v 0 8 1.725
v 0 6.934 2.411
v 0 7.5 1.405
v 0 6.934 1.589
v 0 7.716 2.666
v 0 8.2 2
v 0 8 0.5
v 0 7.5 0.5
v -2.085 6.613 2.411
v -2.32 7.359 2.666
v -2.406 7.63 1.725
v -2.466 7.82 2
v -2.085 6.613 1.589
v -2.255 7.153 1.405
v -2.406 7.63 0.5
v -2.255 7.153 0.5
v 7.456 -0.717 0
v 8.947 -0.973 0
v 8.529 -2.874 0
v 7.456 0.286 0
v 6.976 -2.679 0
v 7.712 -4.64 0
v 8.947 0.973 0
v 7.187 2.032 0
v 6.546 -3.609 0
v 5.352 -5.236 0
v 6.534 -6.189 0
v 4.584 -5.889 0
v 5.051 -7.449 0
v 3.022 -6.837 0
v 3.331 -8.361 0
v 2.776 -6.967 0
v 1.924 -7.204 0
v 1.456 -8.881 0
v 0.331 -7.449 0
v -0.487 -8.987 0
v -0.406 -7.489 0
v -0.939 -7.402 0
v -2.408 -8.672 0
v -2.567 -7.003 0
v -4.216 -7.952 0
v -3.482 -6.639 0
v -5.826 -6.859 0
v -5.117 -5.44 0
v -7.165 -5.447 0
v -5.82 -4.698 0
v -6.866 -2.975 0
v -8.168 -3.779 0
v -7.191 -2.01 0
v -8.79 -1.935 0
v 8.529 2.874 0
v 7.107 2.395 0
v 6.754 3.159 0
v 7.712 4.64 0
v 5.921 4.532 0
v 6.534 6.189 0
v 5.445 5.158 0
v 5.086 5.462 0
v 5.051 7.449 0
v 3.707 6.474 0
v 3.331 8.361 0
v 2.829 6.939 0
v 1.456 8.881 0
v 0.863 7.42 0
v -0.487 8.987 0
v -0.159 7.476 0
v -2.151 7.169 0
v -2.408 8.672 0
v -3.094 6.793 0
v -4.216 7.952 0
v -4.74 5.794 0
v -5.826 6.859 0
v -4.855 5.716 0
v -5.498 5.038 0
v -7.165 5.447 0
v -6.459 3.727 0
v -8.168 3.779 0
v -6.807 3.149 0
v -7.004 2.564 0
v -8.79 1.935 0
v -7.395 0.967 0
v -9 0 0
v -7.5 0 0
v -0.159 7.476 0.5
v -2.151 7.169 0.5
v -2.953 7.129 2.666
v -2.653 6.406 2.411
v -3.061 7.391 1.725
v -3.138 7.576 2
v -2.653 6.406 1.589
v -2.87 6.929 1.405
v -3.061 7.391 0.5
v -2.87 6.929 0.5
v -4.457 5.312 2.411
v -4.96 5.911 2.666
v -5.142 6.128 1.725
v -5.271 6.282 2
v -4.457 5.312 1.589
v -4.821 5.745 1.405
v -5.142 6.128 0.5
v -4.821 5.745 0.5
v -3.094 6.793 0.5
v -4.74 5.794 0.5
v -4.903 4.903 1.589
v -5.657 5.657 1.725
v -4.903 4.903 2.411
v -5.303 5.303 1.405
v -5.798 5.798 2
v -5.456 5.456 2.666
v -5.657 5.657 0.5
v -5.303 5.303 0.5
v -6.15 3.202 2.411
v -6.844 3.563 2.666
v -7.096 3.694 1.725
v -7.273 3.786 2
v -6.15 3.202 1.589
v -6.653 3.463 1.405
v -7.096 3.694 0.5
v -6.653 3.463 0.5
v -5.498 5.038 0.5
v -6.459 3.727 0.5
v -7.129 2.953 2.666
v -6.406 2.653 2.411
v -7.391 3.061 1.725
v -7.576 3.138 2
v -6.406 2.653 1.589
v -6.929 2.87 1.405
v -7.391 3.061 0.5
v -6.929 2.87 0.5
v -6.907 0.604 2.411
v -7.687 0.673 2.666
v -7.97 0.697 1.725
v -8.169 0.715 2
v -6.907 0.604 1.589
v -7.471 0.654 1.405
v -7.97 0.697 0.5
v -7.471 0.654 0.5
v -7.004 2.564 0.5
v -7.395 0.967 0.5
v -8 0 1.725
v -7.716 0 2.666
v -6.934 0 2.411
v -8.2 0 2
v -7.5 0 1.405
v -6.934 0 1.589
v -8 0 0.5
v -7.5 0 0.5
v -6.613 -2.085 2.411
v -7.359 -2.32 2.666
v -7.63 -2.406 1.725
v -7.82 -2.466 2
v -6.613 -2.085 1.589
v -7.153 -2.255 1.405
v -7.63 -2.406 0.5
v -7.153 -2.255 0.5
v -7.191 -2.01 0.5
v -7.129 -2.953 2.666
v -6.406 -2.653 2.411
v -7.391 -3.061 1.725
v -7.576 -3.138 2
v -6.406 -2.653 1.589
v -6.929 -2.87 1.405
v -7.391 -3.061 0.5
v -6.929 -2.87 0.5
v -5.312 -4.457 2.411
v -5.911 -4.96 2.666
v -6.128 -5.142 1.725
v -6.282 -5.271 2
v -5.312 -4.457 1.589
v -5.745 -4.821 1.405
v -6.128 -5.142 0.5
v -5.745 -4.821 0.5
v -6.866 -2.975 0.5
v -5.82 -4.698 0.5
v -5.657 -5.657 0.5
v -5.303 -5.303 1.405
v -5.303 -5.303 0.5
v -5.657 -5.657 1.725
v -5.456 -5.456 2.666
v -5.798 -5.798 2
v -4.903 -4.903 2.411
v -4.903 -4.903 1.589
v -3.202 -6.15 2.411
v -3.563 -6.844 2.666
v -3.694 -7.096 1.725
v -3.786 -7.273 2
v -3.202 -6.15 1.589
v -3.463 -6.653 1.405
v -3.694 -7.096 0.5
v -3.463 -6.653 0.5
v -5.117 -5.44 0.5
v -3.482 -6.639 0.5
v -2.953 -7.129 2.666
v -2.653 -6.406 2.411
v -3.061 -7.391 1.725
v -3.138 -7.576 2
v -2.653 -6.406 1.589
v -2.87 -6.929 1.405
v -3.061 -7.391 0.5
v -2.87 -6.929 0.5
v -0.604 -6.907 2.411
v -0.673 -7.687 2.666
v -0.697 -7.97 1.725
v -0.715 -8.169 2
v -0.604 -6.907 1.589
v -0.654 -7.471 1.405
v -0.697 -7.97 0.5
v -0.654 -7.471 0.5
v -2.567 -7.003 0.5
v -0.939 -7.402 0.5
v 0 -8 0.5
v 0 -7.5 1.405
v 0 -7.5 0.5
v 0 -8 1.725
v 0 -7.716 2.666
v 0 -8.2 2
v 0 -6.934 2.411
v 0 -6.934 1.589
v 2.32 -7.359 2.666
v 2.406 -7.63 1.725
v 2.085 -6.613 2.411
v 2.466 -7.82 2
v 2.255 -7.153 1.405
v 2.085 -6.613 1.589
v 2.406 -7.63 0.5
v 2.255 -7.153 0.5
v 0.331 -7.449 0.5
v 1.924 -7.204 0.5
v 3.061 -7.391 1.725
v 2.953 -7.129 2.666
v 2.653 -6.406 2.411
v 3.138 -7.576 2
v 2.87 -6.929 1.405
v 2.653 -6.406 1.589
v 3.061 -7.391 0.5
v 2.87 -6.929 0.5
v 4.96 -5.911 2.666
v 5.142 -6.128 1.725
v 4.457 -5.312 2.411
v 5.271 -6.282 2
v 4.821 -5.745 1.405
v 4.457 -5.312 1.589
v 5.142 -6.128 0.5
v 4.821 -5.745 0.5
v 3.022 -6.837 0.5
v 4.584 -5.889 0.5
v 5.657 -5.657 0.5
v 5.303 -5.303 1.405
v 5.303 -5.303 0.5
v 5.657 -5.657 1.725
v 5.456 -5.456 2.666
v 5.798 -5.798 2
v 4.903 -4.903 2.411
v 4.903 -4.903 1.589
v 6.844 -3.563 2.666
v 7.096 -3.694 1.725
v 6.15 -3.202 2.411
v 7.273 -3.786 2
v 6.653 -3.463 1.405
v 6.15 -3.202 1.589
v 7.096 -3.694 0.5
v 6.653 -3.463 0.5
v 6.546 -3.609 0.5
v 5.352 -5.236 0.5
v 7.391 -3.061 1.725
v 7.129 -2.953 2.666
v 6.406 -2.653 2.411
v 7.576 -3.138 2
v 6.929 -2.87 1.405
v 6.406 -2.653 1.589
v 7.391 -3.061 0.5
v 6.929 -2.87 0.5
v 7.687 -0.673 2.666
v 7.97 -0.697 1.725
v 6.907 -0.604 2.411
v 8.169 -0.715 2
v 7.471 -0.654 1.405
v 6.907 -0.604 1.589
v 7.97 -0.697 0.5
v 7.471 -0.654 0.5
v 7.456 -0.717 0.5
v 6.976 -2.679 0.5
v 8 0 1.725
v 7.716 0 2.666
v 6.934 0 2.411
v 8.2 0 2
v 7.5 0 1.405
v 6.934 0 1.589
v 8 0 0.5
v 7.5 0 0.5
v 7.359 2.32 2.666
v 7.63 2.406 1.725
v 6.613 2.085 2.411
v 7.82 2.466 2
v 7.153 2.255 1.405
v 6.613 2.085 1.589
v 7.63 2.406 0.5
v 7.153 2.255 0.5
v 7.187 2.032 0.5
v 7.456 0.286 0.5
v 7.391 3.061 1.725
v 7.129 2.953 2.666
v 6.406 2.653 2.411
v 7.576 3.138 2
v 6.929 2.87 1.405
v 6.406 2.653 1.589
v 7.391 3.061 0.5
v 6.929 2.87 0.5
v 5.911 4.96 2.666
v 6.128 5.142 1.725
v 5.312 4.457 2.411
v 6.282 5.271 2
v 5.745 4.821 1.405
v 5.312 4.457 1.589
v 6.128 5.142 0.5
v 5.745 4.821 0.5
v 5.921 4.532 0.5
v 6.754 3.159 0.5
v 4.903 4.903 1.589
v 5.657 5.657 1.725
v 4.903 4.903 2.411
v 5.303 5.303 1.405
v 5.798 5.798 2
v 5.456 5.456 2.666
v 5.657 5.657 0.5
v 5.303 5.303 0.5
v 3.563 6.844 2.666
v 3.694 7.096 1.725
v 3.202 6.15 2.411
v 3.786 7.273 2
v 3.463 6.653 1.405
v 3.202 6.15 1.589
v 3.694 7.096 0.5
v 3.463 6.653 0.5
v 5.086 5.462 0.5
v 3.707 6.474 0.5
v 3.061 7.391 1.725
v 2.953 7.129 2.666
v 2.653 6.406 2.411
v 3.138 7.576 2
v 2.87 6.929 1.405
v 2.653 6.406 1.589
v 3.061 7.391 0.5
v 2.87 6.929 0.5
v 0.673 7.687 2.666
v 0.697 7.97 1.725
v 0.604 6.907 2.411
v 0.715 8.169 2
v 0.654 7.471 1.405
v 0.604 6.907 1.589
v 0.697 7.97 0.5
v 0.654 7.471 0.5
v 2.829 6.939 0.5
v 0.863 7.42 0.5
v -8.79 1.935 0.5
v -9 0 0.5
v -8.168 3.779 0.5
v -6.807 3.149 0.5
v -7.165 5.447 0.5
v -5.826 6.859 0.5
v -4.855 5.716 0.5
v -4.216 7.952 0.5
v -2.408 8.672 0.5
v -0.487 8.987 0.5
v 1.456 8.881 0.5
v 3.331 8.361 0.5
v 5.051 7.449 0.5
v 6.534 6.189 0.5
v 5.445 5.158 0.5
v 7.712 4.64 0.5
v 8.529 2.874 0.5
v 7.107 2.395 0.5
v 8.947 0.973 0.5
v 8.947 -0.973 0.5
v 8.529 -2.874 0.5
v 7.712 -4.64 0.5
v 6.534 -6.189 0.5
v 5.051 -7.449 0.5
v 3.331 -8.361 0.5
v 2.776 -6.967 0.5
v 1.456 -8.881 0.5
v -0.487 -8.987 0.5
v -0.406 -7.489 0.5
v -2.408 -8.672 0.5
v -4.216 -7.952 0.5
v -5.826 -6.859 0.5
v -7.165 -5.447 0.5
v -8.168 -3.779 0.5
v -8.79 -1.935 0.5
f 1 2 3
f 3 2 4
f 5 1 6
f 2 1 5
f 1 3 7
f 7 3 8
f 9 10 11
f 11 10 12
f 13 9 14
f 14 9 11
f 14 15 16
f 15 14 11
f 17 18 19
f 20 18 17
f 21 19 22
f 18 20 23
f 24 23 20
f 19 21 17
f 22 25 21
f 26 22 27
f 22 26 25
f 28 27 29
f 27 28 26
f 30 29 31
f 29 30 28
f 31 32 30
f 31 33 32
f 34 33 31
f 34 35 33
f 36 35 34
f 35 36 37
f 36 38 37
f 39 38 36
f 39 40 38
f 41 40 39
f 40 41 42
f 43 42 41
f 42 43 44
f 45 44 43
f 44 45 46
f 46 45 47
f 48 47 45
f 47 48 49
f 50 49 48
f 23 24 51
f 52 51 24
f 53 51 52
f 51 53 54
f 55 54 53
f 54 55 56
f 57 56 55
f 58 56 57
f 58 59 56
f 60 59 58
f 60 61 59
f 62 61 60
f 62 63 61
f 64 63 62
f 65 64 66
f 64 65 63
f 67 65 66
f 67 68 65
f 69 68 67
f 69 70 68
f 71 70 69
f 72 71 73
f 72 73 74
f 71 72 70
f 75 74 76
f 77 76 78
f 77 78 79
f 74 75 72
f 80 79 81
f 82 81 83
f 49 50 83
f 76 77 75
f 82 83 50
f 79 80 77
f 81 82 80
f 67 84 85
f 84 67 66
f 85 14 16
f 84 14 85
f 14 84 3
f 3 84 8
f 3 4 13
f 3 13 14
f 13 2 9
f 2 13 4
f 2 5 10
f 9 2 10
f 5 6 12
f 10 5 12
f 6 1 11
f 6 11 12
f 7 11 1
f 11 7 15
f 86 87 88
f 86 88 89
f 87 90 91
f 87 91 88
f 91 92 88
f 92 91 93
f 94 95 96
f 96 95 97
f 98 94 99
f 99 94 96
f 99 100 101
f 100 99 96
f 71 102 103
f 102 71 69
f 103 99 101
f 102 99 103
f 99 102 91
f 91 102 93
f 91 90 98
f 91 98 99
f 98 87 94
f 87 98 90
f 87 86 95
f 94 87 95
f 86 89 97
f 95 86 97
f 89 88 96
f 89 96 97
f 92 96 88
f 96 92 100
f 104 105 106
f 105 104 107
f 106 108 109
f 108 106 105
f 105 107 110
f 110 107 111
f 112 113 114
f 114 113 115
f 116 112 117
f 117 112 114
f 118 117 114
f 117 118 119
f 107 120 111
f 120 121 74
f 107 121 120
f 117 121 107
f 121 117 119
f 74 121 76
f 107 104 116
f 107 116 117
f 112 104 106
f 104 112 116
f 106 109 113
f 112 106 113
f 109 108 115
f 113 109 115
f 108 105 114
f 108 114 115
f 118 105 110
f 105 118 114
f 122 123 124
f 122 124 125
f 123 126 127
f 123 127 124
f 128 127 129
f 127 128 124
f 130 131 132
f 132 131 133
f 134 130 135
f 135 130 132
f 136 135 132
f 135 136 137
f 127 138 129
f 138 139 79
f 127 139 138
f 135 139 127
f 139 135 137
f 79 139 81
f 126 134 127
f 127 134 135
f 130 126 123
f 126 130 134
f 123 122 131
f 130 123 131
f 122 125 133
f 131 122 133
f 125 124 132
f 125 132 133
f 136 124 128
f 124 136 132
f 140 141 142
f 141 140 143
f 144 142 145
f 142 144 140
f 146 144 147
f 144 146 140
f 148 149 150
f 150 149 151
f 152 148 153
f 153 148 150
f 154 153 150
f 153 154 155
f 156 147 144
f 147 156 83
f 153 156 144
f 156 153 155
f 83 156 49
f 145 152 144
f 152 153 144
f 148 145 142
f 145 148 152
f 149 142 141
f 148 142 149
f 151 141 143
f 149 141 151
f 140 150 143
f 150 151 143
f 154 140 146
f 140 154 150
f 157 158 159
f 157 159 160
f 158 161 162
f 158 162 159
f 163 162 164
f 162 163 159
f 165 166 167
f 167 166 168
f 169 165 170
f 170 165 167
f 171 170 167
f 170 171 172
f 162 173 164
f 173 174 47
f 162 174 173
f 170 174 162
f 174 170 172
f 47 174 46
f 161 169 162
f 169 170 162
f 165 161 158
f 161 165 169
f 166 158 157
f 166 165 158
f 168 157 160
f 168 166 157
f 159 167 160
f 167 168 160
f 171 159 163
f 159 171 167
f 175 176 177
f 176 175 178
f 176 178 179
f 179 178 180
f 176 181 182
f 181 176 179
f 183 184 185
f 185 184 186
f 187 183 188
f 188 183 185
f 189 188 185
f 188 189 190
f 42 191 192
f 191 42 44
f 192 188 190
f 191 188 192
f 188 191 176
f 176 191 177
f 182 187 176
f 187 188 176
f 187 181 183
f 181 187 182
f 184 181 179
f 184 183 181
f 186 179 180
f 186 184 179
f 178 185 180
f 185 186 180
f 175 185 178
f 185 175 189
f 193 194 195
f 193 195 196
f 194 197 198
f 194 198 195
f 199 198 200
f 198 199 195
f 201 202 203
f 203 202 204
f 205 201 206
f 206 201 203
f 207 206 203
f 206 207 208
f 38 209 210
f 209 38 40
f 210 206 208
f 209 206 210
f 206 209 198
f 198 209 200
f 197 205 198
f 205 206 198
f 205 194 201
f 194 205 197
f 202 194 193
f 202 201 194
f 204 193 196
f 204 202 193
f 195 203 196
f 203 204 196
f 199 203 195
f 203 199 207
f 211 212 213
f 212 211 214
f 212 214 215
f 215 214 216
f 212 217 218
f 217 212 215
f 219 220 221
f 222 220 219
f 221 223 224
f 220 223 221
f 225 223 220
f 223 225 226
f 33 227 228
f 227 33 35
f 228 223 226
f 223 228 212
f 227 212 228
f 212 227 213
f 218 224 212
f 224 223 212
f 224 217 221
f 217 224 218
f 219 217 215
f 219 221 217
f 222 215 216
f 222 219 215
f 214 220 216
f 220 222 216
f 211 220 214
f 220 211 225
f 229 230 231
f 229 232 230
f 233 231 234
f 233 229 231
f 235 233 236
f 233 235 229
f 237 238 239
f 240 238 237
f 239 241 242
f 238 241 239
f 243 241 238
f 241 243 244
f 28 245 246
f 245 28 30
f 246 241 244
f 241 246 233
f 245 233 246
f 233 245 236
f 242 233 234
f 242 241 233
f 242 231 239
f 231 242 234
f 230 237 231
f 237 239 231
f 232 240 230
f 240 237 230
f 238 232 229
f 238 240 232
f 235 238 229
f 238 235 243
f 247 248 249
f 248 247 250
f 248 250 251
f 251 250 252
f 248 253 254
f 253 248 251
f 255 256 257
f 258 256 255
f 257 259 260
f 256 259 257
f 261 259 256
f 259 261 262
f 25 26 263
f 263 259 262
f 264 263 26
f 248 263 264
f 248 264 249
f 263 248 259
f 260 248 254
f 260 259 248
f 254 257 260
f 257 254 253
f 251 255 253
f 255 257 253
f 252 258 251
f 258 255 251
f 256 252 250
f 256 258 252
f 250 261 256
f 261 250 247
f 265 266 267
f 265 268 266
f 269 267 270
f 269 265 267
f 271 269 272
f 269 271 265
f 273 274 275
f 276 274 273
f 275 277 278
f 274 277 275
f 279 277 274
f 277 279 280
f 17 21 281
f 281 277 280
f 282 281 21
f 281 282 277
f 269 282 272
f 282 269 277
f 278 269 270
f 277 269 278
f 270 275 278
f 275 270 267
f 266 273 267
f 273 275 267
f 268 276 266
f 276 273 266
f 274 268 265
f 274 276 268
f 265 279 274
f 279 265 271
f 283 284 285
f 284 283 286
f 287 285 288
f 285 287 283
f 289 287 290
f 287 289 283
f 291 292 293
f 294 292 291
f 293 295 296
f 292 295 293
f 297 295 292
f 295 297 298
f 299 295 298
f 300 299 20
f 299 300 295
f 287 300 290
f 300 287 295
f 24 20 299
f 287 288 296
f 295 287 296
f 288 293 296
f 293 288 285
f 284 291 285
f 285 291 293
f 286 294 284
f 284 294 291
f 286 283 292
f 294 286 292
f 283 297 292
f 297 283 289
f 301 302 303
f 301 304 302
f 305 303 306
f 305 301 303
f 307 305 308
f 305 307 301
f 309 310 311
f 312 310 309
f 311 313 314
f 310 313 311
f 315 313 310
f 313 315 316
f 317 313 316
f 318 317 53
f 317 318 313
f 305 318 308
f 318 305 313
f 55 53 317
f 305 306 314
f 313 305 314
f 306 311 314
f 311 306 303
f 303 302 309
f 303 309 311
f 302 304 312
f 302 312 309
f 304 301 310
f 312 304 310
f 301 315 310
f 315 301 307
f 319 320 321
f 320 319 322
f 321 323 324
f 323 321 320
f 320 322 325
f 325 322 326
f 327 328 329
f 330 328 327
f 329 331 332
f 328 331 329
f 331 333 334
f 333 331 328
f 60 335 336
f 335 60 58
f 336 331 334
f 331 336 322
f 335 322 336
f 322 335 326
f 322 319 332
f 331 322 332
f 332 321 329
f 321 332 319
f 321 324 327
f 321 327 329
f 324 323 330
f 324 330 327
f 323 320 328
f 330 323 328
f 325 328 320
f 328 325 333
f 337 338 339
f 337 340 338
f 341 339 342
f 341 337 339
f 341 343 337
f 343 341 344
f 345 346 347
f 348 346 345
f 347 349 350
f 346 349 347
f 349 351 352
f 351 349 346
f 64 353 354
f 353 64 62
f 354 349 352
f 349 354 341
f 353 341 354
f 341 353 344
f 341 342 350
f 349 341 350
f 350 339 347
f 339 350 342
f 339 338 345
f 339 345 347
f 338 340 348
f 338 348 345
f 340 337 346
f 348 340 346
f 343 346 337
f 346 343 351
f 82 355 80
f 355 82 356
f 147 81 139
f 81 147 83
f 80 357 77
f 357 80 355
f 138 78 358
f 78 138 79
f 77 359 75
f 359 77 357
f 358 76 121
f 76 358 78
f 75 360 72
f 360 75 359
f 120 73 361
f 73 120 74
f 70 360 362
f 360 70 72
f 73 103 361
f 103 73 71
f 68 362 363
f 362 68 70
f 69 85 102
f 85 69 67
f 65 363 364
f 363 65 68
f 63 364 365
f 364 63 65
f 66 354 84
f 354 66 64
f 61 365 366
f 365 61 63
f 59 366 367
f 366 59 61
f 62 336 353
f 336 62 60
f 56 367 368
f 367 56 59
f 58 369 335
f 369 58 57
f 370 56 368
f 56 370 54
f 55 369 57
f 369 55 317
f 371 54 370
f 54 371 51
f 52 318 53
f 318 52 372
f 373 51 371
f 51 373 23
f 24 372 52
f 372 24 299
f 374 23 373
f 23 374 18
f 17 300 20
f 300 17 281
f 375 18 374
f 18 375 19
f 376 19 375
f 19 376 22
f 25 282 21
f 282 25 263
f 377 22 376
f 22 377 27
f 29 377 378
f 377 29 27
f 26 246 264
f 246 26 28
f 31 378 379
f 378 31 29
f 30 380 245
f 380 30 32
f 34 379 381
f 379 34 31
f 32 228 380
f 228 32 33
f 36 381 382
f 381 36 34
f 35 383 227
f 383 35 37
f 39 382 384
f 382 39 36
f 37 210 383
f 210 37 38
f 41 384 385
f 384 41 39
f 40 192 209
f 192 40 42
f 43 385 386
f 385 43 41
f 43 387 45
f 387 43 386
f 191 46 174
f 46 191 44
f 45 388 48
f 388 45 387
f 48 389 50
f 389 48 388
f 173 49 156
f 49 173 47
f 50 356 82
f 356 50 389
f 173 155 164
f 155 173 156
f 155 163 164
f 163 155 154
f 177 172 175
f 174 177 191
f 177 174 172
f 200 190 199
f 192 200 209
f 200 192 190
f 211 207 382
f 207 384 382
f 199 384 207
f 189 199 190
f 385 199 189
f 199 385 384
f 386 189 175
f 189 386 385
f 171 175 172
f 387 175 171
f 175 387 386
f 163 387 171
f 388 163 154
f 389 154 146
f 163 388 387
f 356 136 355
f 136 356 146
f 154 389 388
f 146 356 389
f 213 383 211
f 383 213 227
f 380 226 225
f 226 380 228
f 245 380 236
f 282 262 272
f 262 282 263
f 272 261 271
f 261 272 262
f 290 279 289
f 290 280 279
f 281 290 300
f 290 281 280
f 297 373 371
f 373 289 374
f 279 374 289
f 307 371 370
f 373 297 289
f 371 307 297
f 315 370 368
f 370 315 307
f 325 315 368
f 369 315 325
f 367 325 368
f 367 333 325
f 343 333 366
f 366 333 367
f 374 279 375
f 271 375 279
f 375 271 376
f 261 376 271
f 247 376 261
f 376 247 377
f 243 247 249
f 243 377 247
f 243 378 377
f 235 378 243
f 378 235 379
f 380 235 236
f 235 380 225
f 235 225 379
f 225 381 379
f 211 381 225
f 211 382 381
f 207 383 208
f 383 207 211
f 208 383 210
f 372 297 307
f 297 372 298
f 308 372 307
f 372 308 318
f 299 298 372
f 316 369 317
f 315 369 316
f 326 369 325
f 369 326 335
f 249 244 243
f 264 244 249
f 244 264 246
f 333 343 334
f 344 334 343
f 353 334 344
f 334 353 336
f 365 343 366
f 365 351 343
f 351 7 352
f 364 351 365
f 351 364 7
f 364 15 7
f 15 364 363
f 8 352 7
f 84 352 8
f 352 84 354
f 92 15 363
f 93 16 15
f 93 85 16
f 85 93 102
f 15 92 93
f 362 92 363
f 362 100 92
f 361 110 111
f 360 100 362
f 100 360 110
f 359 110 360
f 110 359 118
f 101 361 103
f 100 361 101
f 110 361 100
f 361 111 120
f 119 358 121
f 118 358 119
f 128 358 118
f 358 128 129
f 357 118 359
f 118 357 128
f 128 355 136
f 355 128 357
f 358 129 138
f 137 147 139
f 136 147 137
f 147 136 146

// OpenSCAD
// file: breadwinner.scad
use <../common/circle_sector.scad>

// units are in millimeters as measured with metric calipers, approximate values
function breadwinner_diameter() = 87.4;
function breadwinner_edge_height() = 3.5;
function breadwinner_center_sensor_hole_diameter() = 15.0;

function breadwinner_socket_skirt_wall_thickness() = 1.0;
function breadwinner_socket_baseplate_thickness() = 1.0;

function breadwinner_socket_outer_diameter() = breadwinner_diameter() + 2 * breadwinner_socket_skirt_wall_thickness();

module breadwinner_socket(bt = breadwinner_socket_baseplate_thickness(), wt = breadwinner_socket_skirt_wall_thickness()) {
    baseplate_w = (breadwinner_diameter() - breadwinner_center_sensor_hole_diameter()) / 2;

    baseplate_offset_x = breadwinner_center_sensor_hole_diameter() / 2;
    skirt_offset_x = baseplate_offset_x + baseplate_w;
    skirt_h = breadwinner_edge_height() + bt;

    rotate_extrude() {
        union() {
            translate([baseplate_offset_x, 0]) square([baseplate_w, bt], center = false);
            translate([skirt_offset_x, 0]) square([wt, skirt_h], center = false);
        }
    }
}

breadwinner_socket();
// file: ../common/circle_sector.scad
module circle_sector(r = 0, d = 0, a = [0, 180]) {
    r = max(r, d * 2);
    sector_r = r / cos(180 / $fn);
    step = -360 / $fn;

    points = concat([[0, 0]],
        [for(a = [a[0] : step : a[1] - 360])
            [sector_r * cos(a), sector_r * sin(a)]
        ],
        [[sector_r * cos(a[1]), sector_r * sin(a[1])]]
    );

    difference() {
        circle(r);
        polygon(points);
    }
}

circle_sector();
// main file
use <../common/circle_sector.scad>
use <breadwinner.scad>

function breadwinner_center_snap_ring_inner_diameter() = breadwinner_center_sensor_hole_diameter();
function breadwinner_center_snap_ring_outer_diameter() = breadwinner_center_snap_ring_inner_diameter() + 1.0;

function breadwinner_center_snap_ring_rim_diameter() = breadwinner_center_snap_ring_outer_diameter() + 3.0;
function breadwinner_center_snap_ring_rim_thickness() = breadwinner_socket_baseplate_thickness() / 2;
function breadwinner_center_snap_ring_height() = 2.0;
function breadwinner_center_snap_ring_hook_overhang() = 0.2;
function breadwinner_center_snap_ring_number_of_cutouts() = 16;
function breadwinner_center_snap_ring_cutout_radius() = 5;

module breadwinner_center_snap_ring_hooks(
    id = breadwinner_center_snap_ring_inner_diameter(),
    od = breadwinner_center_snap_ring_outer_diameter(),
    h = breadwinner_center_snap_ring_height(),
    ho = breadwinner_center_snap_ring_hook_overhang(),
    noc = breadwinner_center_snap_ring_number_of_cutouts(),
    cr = breadwinner_center_snap_ring_cutout_radius()
) {
    w = (od - id) / 2;
    ring_offset_x = id / 2;

    hook_d = w + ho;

    round_tip_offset_x = ring_offset_x;
    round_tip_offset_y = h;

    extrude_radius = 360 / noc - cr;
    for(rotate_degrees = [0 : 360 / noc : 360 - 360 / noc])
    rotate([0, 0, rotate_degrees])
        rotate([0, 0, 90])
            rotate_extrude(angle = extrude_radius)

            union() {
            translate([ring_offset_x, 0]) square([w, h], center = false);
            translate([round_tip_offset_x, round_tip_offset_y]) circle_sector(r = hook_d, a = [0, 90]);
        }
}

// Breadwinner base plate center hole should accomodate the center snap ring thickness. Also the
// rim should fit into a countersink hole as not to protrude from the surface of the base plate.
module breadwinner_center_snap_ring(
    id = breadwinner_center_snap_ring_inner_diameter(),
    od = breadwinner_center_snap_ring_outer_diameter(),
    rd = breadwinner_center_snap_ring_rim_diameter(),
    t = breadwinner_center_snap_ring_rim_thickness(),
    h = breadwinner_center_snap_ring_height(),
    ho = breadwinner_center_snap_ring_hook_overhang()
) {
    w = (od - id) / 2;
    rim_offset_x = id / 2;
    rim_offset_y = 0;
    rim_w = (rd - od) / 2;

    ring_offset_x = id / 2;

    hook_d = w + ho;
    round_tip_offset_x = ring_offset_x;
    round_tip_offset_y = h;

    cutout_h = h + hook_d;
    cutout_translate = [0, 0, t + 0.1];

    union() {
        rotate_extrude() {
            translate([rim_offset_x, rim_offset_y]) square([rim_w, t], center = false);
        }
        breadwinner_center_snap_ring_hooks(id = id, od = od, h = h, ho = ho);
    }
}

breadwinner_center_snap_ring();
